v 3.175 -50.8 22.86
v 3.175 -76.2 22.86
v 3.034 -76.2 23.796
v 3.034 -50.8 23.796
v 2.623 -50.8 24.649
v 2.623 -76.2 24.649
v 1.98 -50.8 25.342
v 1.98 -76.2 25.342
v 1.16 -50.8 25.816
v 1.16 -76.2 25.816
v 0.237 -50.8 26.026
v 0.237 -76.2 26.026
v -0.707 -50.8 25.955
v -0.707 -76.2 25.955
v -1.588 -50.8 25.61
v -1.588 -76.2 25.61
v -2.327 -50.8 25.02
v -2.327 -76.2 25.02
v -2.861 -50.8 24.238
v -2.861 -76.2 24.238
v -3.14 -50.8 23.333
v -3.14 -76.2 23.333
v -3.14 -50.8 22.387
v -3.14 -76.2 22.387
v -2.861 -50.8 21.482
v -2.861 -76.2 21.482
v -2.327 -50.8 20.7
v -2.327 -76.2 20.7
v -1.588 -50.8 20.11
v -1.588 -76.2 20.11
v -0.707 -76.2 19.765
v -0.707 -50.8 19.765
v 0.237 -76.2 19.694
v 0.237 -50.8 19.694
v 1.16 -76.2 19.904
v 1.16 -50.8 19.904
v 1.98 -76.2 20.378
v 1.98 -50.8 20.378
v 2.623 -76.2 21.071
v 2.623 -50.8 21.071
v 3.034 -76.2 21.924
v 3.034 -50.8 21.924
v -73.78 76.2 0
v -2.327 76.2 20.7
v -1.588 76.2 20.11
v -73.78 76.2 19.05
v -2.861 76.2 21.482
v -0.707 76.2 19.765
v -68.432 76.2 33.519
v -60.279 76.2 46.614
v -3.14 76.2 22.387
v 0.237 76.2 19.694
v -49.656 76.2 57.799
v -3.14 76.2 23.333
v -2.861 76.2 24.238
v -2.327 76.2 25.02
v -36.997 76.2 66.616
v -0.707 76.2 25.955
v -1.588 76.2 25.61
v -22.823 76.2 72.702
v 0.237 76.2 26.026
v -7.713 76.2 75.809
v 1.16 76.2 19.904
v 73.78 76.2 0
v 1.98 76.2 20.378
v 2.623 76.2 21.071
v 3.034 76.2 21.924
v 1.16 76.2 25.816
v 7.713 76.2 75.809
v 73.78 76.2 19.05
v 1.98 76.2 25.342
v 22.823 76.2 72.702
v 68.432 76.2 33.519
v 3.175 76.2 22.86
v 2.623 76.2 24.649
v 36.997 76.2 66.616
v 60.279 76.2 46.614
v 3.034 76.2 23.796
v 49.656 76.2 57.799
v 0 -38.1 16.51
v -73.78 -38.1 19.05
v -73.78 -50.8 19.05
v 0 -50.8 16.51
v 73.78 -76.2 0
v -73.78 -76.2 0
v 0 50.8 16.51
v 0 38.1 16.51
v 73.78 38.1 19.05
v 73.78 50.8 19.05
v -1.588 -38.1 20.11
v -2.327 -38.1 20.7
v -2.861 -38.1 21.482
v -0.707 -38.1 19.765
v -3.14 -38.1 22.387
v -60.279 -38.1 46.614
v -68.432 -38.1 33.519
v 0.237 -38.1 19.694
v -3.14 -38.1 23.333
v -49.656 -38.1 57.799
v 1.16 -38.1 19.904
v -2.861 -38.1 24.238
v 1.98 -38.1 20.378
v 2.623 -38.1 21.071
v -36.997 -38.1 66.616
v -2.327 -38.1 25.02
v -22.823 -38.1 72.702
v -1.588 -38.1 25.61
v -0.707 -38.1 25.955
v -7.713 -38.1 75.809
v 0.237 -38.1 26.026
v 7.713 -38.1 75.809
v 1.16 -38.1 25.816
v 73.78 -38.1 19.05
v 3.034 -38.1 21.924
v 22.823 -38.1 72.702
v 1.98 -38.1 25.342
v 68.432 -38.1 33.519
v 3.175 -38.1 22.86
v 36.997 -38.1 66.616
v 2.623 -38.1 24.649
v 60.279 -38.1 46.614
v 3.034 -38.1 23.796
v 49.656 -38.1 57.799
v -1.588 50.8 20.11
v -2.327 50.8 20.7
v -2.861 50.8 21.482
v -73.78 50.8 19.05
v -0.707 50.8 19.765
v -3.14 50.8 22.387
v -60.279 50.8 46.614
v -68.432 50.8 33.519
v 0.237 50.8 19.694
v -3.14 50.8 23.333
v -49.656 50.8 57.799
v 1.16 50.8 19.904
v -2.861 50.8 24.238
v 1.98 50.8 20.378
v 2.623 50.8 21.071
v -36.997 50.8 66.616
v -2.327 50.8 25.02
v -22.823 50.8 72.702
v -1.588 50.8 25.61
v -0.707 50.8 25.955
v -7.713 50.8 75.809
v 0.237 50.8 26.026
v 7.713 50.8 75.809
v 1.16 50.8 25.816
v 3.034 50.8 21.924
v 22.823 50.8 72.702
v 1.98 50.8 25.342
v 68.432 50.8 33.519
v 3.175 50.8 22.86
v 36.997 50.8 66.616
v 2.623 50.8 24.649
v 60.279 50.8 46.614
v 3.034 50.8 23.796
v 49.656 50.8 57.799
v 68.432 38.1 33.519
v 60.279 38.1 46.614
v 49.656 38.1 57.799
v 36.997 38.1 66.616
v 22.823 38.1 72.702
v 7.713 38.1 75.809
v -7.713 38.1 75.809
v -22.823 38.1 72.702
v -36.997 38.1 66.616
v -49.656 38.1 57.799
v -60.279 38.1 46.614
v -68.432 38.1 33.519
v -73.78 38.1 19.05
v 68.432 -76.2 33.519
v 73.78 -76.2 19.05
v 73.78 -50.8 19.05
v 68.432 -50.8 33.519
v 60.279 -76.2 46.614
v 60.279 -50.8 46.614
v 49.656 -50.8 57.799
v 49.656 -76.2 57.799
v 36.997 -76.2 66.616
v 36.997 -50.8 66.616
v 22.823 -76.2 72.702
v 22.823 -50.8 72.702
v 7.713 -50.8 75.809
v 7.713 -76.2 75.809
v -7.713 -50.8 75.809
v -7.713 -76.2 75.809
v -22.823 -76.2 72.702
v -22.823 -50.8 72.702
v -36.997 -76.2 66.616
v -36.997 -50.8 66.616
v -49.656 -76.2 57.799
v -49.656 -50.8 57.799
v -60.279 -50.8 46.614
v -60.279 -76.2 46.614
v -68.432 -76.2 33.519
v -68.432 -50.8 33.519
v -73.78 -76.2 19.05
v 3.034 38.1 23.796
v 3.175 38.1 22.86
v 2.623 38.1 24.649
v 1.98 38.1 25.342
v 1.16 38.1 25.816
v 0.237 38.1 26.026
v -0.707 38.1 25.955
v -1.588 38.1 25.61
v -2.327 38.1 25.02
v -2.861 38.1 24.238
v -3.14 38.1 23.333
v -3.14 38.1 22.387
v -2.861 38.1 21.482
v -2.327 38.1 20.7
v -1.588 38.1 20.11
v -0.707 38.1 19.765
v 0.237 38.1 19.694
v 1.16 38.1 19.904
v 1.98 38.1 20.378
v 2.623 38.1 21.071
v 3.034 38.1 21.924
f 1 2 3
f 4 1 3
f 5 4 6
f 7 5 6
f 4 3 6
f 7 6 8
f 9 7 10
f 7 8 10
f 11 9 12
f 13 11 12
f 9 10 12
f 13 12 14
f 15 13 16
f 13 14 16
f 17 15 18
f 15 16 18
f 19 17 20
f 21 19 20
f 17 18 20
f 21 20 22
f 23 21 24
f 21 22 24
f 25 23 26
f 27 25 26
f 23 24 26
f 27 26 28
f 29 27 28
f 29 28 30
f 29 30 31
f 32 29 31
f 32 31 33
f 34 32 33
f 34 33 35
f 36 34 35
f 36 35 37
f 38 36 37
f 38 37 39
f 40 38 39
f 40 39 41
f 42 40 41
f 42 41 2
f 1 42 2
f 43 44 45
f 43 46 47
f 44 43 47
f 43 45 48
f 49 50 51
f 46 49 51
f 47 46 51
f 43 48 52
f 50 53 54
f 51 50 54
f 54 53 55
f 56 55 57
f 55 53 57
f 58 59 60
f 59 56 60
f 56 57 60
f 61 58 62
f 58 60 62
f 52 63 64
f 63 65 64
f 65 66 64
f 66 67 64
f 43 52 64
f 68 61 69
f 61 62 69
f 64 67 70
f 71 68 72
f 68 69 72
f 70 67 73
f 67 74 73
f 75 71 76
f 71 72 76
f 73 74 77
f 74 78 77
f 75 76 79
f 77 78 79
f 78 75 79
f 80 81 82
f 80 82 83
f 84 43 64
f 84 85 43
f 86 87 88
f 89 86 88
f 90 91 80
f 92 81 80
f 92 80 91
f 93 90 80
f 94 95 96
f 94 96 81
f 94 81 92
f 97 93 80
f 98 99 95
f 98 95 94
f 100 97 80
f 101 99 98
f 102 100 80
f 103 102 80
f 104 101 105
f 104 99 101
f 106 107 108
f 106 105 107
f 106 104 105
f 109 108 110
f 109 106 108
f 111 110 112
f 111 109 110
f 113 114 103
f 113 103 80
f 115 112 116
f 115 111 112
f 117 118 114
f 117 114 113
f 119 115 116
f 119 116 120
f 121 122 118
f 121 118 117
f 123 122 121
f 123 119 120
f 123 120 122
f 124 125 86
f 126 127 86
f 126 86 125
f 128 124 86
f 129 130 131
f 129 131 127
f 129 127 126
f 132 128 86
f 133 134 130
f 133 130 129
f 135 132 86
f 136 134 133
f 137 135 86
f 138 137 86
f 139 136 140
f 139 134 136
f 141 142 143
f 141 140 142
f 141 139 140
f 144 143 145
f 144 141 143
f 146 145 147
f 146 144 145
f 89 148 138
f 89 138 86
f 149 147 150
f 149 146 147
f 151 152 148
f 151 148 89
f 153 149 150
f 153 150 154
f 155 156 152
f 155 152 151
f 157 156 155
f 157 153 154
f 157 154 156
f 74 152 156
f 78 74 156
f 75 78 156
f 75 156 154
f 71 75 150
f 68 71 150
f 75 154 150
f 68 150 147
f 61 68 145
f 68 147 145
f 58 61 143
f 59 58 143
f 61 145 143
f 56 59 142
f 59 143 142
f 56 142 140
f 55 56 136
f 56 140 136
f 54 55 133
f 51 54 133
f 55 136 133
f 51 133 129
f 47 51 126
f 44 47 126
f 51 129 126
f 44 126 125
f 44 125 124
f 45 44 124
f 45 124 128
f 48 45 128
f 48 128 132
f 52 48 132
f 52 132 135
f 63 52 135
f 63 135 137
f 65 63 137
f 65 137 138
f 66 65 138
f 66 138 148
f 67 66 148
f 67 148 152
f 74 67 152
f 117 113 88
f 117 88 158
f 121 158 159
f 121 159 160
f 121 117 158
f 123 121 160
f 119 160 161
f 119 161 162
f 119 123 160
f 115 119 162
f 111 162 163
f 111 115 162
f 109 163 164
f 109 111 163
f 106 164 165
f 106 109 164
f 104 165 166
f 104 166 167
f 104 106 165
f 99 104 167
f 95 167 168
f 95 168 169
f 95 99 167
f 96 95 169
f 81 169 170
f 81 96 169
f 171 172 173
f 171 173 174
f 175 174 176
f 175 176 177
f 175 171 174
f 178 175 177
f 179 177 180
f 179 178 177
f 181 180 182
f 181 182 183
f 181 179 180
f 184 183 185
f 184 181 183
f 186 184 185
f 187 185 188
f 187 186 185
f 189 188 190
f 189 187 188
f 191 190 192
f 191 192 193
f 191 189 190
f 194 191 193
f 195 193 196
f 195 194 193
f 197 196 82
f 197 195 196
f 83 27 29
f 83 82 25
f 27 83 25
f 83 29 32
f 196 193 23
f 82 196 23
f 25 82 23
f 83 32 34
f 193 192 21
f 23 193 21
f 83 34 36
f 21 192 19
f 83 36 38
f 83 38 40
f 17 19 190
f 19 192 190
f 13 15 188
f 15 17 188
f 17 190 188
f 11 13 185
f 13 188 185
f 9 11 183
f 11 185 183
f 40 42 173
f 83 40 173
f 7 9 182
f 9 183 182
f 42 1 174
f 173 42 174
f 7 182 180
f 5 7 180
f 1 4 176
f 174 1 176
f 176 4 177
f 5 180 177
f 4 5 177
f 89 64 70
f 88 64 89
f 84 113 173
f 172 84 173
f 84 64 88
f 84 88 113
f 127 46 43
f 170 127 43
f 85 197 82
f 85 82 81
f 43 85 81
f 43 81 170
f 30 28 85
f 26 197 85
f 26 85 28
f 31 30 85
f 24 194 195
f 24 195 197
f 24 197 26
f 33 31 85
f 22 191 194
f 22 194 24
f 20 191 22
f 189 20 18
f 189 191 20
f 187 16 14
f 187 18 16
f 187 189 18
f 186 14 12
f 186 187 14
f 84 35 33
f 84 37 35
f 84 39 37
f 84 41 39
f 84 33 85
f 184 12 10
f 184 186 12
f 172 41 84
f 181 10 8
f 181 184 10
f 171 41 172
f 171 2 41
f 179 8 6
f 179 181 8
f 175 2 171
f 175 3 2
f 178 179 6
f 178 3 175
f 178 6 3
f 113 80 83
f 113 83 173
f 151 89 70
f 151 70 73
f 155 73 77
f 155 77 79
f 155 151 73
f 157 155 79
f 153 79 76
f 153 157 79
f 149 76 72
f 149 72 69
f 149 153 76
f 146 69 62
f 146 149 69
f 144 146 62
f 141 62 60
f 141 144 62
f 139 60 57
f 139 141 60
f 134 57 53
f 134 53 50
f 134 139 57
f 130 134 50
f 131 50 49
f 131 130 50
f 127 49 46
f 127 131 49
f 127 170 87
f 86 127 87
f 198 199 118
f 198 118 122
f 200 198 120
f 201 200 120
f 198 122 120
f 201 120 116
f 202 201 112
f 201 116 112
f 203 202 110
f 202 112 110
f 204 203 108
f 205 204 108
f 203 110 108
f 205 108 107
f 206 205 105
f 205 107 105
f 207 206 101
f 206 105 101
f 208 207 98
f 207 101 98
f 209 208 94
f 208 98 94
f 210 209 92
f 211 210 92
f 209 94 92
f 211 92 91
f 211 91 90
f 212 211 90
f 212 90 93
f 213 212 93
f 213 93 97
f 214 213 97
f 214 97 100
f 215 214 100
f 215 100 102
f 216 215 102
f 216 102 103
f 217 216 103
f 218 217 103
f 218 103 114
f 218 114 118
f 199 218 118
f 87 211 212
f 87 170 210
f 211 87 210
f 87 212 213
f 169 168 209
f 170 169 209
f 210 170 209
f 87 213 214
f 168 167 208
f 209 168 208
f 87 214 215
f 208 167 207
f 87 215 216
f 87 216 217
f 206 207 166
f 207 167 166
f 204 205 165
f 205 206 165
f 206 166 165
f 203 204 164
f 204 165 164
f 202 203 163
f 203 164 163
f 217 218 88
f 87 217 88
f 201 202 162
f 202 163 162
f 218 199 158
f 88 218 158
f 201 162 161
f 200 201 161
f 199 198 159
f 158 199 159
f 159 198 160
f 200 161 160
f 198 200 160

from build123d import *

# Parameters (mm, degrees)
F1_DEPTH = 76.2
F2_START = -38.1
F2_DEPTH = 12.7
F3_R     = 3.175
F4_DEPTH = 152.4


# Not quite as in the source:
# - a pattern or mirror of a feature is missing from the dataset's text; its kind, count and spacing are read off the source's solid


with BuildPart() as f1:
    # F0 (on Front) → F1 (new body, symmetric)
    with BuildSketch(Plane.XZ):
        Polygon((73.7803327453, 0), (73.7803327453, 19.05), (0, 16.51), (-73.7803327453, 19.05), (-73.7803327453, 0), align=None)
        with BuildLine():
            Line((0, 16.51), (73.7803327453, 19.05))
            ThreePointArc((73.7803327453, 19.05), (0, 76.2), (-73.7803327453, 19.05))
            Line((-73.7803327453, 19.05), (0, 16.51))
        make_face()
    extrude(amount=F1_DEPTH, both=True)

    # F0 (on Front) → F2 (cut)
    with BuildSketch(Plane.XZ.offset(F2_START)):
        with BuildLine():
            Line((0, 16.51), (73.7803327453, 19.05))
            ThreePointArc((73.7803327453, 19.05), (0, 76.2), (-73.7803327453, 19.05))
            Line((-73.7803327453, 19.05), (0, 16.51))
        make_face()
    f2 = extrude(amount=-F2_DEPTH, mode=Mode.SUBTRACT)

    # F2_copies: F2 across plane
    add(f2.mirror(Plane(origin=(0, 0, 0), x_dir=(0, 0, -1), z_dir=(0, -1, 0))), mode=Mode.SUBTRACT)

    # F3 (on face) → F4 (cut)
    with BuildSketch(Plane.XZ.offset(76.2)):
        with Locations((0, 22.86)):
            Circle(F3_R)
    extrude(amount=-F4_DEPTH, mode=Mode.SUBTRACT)


solid = f1.part
